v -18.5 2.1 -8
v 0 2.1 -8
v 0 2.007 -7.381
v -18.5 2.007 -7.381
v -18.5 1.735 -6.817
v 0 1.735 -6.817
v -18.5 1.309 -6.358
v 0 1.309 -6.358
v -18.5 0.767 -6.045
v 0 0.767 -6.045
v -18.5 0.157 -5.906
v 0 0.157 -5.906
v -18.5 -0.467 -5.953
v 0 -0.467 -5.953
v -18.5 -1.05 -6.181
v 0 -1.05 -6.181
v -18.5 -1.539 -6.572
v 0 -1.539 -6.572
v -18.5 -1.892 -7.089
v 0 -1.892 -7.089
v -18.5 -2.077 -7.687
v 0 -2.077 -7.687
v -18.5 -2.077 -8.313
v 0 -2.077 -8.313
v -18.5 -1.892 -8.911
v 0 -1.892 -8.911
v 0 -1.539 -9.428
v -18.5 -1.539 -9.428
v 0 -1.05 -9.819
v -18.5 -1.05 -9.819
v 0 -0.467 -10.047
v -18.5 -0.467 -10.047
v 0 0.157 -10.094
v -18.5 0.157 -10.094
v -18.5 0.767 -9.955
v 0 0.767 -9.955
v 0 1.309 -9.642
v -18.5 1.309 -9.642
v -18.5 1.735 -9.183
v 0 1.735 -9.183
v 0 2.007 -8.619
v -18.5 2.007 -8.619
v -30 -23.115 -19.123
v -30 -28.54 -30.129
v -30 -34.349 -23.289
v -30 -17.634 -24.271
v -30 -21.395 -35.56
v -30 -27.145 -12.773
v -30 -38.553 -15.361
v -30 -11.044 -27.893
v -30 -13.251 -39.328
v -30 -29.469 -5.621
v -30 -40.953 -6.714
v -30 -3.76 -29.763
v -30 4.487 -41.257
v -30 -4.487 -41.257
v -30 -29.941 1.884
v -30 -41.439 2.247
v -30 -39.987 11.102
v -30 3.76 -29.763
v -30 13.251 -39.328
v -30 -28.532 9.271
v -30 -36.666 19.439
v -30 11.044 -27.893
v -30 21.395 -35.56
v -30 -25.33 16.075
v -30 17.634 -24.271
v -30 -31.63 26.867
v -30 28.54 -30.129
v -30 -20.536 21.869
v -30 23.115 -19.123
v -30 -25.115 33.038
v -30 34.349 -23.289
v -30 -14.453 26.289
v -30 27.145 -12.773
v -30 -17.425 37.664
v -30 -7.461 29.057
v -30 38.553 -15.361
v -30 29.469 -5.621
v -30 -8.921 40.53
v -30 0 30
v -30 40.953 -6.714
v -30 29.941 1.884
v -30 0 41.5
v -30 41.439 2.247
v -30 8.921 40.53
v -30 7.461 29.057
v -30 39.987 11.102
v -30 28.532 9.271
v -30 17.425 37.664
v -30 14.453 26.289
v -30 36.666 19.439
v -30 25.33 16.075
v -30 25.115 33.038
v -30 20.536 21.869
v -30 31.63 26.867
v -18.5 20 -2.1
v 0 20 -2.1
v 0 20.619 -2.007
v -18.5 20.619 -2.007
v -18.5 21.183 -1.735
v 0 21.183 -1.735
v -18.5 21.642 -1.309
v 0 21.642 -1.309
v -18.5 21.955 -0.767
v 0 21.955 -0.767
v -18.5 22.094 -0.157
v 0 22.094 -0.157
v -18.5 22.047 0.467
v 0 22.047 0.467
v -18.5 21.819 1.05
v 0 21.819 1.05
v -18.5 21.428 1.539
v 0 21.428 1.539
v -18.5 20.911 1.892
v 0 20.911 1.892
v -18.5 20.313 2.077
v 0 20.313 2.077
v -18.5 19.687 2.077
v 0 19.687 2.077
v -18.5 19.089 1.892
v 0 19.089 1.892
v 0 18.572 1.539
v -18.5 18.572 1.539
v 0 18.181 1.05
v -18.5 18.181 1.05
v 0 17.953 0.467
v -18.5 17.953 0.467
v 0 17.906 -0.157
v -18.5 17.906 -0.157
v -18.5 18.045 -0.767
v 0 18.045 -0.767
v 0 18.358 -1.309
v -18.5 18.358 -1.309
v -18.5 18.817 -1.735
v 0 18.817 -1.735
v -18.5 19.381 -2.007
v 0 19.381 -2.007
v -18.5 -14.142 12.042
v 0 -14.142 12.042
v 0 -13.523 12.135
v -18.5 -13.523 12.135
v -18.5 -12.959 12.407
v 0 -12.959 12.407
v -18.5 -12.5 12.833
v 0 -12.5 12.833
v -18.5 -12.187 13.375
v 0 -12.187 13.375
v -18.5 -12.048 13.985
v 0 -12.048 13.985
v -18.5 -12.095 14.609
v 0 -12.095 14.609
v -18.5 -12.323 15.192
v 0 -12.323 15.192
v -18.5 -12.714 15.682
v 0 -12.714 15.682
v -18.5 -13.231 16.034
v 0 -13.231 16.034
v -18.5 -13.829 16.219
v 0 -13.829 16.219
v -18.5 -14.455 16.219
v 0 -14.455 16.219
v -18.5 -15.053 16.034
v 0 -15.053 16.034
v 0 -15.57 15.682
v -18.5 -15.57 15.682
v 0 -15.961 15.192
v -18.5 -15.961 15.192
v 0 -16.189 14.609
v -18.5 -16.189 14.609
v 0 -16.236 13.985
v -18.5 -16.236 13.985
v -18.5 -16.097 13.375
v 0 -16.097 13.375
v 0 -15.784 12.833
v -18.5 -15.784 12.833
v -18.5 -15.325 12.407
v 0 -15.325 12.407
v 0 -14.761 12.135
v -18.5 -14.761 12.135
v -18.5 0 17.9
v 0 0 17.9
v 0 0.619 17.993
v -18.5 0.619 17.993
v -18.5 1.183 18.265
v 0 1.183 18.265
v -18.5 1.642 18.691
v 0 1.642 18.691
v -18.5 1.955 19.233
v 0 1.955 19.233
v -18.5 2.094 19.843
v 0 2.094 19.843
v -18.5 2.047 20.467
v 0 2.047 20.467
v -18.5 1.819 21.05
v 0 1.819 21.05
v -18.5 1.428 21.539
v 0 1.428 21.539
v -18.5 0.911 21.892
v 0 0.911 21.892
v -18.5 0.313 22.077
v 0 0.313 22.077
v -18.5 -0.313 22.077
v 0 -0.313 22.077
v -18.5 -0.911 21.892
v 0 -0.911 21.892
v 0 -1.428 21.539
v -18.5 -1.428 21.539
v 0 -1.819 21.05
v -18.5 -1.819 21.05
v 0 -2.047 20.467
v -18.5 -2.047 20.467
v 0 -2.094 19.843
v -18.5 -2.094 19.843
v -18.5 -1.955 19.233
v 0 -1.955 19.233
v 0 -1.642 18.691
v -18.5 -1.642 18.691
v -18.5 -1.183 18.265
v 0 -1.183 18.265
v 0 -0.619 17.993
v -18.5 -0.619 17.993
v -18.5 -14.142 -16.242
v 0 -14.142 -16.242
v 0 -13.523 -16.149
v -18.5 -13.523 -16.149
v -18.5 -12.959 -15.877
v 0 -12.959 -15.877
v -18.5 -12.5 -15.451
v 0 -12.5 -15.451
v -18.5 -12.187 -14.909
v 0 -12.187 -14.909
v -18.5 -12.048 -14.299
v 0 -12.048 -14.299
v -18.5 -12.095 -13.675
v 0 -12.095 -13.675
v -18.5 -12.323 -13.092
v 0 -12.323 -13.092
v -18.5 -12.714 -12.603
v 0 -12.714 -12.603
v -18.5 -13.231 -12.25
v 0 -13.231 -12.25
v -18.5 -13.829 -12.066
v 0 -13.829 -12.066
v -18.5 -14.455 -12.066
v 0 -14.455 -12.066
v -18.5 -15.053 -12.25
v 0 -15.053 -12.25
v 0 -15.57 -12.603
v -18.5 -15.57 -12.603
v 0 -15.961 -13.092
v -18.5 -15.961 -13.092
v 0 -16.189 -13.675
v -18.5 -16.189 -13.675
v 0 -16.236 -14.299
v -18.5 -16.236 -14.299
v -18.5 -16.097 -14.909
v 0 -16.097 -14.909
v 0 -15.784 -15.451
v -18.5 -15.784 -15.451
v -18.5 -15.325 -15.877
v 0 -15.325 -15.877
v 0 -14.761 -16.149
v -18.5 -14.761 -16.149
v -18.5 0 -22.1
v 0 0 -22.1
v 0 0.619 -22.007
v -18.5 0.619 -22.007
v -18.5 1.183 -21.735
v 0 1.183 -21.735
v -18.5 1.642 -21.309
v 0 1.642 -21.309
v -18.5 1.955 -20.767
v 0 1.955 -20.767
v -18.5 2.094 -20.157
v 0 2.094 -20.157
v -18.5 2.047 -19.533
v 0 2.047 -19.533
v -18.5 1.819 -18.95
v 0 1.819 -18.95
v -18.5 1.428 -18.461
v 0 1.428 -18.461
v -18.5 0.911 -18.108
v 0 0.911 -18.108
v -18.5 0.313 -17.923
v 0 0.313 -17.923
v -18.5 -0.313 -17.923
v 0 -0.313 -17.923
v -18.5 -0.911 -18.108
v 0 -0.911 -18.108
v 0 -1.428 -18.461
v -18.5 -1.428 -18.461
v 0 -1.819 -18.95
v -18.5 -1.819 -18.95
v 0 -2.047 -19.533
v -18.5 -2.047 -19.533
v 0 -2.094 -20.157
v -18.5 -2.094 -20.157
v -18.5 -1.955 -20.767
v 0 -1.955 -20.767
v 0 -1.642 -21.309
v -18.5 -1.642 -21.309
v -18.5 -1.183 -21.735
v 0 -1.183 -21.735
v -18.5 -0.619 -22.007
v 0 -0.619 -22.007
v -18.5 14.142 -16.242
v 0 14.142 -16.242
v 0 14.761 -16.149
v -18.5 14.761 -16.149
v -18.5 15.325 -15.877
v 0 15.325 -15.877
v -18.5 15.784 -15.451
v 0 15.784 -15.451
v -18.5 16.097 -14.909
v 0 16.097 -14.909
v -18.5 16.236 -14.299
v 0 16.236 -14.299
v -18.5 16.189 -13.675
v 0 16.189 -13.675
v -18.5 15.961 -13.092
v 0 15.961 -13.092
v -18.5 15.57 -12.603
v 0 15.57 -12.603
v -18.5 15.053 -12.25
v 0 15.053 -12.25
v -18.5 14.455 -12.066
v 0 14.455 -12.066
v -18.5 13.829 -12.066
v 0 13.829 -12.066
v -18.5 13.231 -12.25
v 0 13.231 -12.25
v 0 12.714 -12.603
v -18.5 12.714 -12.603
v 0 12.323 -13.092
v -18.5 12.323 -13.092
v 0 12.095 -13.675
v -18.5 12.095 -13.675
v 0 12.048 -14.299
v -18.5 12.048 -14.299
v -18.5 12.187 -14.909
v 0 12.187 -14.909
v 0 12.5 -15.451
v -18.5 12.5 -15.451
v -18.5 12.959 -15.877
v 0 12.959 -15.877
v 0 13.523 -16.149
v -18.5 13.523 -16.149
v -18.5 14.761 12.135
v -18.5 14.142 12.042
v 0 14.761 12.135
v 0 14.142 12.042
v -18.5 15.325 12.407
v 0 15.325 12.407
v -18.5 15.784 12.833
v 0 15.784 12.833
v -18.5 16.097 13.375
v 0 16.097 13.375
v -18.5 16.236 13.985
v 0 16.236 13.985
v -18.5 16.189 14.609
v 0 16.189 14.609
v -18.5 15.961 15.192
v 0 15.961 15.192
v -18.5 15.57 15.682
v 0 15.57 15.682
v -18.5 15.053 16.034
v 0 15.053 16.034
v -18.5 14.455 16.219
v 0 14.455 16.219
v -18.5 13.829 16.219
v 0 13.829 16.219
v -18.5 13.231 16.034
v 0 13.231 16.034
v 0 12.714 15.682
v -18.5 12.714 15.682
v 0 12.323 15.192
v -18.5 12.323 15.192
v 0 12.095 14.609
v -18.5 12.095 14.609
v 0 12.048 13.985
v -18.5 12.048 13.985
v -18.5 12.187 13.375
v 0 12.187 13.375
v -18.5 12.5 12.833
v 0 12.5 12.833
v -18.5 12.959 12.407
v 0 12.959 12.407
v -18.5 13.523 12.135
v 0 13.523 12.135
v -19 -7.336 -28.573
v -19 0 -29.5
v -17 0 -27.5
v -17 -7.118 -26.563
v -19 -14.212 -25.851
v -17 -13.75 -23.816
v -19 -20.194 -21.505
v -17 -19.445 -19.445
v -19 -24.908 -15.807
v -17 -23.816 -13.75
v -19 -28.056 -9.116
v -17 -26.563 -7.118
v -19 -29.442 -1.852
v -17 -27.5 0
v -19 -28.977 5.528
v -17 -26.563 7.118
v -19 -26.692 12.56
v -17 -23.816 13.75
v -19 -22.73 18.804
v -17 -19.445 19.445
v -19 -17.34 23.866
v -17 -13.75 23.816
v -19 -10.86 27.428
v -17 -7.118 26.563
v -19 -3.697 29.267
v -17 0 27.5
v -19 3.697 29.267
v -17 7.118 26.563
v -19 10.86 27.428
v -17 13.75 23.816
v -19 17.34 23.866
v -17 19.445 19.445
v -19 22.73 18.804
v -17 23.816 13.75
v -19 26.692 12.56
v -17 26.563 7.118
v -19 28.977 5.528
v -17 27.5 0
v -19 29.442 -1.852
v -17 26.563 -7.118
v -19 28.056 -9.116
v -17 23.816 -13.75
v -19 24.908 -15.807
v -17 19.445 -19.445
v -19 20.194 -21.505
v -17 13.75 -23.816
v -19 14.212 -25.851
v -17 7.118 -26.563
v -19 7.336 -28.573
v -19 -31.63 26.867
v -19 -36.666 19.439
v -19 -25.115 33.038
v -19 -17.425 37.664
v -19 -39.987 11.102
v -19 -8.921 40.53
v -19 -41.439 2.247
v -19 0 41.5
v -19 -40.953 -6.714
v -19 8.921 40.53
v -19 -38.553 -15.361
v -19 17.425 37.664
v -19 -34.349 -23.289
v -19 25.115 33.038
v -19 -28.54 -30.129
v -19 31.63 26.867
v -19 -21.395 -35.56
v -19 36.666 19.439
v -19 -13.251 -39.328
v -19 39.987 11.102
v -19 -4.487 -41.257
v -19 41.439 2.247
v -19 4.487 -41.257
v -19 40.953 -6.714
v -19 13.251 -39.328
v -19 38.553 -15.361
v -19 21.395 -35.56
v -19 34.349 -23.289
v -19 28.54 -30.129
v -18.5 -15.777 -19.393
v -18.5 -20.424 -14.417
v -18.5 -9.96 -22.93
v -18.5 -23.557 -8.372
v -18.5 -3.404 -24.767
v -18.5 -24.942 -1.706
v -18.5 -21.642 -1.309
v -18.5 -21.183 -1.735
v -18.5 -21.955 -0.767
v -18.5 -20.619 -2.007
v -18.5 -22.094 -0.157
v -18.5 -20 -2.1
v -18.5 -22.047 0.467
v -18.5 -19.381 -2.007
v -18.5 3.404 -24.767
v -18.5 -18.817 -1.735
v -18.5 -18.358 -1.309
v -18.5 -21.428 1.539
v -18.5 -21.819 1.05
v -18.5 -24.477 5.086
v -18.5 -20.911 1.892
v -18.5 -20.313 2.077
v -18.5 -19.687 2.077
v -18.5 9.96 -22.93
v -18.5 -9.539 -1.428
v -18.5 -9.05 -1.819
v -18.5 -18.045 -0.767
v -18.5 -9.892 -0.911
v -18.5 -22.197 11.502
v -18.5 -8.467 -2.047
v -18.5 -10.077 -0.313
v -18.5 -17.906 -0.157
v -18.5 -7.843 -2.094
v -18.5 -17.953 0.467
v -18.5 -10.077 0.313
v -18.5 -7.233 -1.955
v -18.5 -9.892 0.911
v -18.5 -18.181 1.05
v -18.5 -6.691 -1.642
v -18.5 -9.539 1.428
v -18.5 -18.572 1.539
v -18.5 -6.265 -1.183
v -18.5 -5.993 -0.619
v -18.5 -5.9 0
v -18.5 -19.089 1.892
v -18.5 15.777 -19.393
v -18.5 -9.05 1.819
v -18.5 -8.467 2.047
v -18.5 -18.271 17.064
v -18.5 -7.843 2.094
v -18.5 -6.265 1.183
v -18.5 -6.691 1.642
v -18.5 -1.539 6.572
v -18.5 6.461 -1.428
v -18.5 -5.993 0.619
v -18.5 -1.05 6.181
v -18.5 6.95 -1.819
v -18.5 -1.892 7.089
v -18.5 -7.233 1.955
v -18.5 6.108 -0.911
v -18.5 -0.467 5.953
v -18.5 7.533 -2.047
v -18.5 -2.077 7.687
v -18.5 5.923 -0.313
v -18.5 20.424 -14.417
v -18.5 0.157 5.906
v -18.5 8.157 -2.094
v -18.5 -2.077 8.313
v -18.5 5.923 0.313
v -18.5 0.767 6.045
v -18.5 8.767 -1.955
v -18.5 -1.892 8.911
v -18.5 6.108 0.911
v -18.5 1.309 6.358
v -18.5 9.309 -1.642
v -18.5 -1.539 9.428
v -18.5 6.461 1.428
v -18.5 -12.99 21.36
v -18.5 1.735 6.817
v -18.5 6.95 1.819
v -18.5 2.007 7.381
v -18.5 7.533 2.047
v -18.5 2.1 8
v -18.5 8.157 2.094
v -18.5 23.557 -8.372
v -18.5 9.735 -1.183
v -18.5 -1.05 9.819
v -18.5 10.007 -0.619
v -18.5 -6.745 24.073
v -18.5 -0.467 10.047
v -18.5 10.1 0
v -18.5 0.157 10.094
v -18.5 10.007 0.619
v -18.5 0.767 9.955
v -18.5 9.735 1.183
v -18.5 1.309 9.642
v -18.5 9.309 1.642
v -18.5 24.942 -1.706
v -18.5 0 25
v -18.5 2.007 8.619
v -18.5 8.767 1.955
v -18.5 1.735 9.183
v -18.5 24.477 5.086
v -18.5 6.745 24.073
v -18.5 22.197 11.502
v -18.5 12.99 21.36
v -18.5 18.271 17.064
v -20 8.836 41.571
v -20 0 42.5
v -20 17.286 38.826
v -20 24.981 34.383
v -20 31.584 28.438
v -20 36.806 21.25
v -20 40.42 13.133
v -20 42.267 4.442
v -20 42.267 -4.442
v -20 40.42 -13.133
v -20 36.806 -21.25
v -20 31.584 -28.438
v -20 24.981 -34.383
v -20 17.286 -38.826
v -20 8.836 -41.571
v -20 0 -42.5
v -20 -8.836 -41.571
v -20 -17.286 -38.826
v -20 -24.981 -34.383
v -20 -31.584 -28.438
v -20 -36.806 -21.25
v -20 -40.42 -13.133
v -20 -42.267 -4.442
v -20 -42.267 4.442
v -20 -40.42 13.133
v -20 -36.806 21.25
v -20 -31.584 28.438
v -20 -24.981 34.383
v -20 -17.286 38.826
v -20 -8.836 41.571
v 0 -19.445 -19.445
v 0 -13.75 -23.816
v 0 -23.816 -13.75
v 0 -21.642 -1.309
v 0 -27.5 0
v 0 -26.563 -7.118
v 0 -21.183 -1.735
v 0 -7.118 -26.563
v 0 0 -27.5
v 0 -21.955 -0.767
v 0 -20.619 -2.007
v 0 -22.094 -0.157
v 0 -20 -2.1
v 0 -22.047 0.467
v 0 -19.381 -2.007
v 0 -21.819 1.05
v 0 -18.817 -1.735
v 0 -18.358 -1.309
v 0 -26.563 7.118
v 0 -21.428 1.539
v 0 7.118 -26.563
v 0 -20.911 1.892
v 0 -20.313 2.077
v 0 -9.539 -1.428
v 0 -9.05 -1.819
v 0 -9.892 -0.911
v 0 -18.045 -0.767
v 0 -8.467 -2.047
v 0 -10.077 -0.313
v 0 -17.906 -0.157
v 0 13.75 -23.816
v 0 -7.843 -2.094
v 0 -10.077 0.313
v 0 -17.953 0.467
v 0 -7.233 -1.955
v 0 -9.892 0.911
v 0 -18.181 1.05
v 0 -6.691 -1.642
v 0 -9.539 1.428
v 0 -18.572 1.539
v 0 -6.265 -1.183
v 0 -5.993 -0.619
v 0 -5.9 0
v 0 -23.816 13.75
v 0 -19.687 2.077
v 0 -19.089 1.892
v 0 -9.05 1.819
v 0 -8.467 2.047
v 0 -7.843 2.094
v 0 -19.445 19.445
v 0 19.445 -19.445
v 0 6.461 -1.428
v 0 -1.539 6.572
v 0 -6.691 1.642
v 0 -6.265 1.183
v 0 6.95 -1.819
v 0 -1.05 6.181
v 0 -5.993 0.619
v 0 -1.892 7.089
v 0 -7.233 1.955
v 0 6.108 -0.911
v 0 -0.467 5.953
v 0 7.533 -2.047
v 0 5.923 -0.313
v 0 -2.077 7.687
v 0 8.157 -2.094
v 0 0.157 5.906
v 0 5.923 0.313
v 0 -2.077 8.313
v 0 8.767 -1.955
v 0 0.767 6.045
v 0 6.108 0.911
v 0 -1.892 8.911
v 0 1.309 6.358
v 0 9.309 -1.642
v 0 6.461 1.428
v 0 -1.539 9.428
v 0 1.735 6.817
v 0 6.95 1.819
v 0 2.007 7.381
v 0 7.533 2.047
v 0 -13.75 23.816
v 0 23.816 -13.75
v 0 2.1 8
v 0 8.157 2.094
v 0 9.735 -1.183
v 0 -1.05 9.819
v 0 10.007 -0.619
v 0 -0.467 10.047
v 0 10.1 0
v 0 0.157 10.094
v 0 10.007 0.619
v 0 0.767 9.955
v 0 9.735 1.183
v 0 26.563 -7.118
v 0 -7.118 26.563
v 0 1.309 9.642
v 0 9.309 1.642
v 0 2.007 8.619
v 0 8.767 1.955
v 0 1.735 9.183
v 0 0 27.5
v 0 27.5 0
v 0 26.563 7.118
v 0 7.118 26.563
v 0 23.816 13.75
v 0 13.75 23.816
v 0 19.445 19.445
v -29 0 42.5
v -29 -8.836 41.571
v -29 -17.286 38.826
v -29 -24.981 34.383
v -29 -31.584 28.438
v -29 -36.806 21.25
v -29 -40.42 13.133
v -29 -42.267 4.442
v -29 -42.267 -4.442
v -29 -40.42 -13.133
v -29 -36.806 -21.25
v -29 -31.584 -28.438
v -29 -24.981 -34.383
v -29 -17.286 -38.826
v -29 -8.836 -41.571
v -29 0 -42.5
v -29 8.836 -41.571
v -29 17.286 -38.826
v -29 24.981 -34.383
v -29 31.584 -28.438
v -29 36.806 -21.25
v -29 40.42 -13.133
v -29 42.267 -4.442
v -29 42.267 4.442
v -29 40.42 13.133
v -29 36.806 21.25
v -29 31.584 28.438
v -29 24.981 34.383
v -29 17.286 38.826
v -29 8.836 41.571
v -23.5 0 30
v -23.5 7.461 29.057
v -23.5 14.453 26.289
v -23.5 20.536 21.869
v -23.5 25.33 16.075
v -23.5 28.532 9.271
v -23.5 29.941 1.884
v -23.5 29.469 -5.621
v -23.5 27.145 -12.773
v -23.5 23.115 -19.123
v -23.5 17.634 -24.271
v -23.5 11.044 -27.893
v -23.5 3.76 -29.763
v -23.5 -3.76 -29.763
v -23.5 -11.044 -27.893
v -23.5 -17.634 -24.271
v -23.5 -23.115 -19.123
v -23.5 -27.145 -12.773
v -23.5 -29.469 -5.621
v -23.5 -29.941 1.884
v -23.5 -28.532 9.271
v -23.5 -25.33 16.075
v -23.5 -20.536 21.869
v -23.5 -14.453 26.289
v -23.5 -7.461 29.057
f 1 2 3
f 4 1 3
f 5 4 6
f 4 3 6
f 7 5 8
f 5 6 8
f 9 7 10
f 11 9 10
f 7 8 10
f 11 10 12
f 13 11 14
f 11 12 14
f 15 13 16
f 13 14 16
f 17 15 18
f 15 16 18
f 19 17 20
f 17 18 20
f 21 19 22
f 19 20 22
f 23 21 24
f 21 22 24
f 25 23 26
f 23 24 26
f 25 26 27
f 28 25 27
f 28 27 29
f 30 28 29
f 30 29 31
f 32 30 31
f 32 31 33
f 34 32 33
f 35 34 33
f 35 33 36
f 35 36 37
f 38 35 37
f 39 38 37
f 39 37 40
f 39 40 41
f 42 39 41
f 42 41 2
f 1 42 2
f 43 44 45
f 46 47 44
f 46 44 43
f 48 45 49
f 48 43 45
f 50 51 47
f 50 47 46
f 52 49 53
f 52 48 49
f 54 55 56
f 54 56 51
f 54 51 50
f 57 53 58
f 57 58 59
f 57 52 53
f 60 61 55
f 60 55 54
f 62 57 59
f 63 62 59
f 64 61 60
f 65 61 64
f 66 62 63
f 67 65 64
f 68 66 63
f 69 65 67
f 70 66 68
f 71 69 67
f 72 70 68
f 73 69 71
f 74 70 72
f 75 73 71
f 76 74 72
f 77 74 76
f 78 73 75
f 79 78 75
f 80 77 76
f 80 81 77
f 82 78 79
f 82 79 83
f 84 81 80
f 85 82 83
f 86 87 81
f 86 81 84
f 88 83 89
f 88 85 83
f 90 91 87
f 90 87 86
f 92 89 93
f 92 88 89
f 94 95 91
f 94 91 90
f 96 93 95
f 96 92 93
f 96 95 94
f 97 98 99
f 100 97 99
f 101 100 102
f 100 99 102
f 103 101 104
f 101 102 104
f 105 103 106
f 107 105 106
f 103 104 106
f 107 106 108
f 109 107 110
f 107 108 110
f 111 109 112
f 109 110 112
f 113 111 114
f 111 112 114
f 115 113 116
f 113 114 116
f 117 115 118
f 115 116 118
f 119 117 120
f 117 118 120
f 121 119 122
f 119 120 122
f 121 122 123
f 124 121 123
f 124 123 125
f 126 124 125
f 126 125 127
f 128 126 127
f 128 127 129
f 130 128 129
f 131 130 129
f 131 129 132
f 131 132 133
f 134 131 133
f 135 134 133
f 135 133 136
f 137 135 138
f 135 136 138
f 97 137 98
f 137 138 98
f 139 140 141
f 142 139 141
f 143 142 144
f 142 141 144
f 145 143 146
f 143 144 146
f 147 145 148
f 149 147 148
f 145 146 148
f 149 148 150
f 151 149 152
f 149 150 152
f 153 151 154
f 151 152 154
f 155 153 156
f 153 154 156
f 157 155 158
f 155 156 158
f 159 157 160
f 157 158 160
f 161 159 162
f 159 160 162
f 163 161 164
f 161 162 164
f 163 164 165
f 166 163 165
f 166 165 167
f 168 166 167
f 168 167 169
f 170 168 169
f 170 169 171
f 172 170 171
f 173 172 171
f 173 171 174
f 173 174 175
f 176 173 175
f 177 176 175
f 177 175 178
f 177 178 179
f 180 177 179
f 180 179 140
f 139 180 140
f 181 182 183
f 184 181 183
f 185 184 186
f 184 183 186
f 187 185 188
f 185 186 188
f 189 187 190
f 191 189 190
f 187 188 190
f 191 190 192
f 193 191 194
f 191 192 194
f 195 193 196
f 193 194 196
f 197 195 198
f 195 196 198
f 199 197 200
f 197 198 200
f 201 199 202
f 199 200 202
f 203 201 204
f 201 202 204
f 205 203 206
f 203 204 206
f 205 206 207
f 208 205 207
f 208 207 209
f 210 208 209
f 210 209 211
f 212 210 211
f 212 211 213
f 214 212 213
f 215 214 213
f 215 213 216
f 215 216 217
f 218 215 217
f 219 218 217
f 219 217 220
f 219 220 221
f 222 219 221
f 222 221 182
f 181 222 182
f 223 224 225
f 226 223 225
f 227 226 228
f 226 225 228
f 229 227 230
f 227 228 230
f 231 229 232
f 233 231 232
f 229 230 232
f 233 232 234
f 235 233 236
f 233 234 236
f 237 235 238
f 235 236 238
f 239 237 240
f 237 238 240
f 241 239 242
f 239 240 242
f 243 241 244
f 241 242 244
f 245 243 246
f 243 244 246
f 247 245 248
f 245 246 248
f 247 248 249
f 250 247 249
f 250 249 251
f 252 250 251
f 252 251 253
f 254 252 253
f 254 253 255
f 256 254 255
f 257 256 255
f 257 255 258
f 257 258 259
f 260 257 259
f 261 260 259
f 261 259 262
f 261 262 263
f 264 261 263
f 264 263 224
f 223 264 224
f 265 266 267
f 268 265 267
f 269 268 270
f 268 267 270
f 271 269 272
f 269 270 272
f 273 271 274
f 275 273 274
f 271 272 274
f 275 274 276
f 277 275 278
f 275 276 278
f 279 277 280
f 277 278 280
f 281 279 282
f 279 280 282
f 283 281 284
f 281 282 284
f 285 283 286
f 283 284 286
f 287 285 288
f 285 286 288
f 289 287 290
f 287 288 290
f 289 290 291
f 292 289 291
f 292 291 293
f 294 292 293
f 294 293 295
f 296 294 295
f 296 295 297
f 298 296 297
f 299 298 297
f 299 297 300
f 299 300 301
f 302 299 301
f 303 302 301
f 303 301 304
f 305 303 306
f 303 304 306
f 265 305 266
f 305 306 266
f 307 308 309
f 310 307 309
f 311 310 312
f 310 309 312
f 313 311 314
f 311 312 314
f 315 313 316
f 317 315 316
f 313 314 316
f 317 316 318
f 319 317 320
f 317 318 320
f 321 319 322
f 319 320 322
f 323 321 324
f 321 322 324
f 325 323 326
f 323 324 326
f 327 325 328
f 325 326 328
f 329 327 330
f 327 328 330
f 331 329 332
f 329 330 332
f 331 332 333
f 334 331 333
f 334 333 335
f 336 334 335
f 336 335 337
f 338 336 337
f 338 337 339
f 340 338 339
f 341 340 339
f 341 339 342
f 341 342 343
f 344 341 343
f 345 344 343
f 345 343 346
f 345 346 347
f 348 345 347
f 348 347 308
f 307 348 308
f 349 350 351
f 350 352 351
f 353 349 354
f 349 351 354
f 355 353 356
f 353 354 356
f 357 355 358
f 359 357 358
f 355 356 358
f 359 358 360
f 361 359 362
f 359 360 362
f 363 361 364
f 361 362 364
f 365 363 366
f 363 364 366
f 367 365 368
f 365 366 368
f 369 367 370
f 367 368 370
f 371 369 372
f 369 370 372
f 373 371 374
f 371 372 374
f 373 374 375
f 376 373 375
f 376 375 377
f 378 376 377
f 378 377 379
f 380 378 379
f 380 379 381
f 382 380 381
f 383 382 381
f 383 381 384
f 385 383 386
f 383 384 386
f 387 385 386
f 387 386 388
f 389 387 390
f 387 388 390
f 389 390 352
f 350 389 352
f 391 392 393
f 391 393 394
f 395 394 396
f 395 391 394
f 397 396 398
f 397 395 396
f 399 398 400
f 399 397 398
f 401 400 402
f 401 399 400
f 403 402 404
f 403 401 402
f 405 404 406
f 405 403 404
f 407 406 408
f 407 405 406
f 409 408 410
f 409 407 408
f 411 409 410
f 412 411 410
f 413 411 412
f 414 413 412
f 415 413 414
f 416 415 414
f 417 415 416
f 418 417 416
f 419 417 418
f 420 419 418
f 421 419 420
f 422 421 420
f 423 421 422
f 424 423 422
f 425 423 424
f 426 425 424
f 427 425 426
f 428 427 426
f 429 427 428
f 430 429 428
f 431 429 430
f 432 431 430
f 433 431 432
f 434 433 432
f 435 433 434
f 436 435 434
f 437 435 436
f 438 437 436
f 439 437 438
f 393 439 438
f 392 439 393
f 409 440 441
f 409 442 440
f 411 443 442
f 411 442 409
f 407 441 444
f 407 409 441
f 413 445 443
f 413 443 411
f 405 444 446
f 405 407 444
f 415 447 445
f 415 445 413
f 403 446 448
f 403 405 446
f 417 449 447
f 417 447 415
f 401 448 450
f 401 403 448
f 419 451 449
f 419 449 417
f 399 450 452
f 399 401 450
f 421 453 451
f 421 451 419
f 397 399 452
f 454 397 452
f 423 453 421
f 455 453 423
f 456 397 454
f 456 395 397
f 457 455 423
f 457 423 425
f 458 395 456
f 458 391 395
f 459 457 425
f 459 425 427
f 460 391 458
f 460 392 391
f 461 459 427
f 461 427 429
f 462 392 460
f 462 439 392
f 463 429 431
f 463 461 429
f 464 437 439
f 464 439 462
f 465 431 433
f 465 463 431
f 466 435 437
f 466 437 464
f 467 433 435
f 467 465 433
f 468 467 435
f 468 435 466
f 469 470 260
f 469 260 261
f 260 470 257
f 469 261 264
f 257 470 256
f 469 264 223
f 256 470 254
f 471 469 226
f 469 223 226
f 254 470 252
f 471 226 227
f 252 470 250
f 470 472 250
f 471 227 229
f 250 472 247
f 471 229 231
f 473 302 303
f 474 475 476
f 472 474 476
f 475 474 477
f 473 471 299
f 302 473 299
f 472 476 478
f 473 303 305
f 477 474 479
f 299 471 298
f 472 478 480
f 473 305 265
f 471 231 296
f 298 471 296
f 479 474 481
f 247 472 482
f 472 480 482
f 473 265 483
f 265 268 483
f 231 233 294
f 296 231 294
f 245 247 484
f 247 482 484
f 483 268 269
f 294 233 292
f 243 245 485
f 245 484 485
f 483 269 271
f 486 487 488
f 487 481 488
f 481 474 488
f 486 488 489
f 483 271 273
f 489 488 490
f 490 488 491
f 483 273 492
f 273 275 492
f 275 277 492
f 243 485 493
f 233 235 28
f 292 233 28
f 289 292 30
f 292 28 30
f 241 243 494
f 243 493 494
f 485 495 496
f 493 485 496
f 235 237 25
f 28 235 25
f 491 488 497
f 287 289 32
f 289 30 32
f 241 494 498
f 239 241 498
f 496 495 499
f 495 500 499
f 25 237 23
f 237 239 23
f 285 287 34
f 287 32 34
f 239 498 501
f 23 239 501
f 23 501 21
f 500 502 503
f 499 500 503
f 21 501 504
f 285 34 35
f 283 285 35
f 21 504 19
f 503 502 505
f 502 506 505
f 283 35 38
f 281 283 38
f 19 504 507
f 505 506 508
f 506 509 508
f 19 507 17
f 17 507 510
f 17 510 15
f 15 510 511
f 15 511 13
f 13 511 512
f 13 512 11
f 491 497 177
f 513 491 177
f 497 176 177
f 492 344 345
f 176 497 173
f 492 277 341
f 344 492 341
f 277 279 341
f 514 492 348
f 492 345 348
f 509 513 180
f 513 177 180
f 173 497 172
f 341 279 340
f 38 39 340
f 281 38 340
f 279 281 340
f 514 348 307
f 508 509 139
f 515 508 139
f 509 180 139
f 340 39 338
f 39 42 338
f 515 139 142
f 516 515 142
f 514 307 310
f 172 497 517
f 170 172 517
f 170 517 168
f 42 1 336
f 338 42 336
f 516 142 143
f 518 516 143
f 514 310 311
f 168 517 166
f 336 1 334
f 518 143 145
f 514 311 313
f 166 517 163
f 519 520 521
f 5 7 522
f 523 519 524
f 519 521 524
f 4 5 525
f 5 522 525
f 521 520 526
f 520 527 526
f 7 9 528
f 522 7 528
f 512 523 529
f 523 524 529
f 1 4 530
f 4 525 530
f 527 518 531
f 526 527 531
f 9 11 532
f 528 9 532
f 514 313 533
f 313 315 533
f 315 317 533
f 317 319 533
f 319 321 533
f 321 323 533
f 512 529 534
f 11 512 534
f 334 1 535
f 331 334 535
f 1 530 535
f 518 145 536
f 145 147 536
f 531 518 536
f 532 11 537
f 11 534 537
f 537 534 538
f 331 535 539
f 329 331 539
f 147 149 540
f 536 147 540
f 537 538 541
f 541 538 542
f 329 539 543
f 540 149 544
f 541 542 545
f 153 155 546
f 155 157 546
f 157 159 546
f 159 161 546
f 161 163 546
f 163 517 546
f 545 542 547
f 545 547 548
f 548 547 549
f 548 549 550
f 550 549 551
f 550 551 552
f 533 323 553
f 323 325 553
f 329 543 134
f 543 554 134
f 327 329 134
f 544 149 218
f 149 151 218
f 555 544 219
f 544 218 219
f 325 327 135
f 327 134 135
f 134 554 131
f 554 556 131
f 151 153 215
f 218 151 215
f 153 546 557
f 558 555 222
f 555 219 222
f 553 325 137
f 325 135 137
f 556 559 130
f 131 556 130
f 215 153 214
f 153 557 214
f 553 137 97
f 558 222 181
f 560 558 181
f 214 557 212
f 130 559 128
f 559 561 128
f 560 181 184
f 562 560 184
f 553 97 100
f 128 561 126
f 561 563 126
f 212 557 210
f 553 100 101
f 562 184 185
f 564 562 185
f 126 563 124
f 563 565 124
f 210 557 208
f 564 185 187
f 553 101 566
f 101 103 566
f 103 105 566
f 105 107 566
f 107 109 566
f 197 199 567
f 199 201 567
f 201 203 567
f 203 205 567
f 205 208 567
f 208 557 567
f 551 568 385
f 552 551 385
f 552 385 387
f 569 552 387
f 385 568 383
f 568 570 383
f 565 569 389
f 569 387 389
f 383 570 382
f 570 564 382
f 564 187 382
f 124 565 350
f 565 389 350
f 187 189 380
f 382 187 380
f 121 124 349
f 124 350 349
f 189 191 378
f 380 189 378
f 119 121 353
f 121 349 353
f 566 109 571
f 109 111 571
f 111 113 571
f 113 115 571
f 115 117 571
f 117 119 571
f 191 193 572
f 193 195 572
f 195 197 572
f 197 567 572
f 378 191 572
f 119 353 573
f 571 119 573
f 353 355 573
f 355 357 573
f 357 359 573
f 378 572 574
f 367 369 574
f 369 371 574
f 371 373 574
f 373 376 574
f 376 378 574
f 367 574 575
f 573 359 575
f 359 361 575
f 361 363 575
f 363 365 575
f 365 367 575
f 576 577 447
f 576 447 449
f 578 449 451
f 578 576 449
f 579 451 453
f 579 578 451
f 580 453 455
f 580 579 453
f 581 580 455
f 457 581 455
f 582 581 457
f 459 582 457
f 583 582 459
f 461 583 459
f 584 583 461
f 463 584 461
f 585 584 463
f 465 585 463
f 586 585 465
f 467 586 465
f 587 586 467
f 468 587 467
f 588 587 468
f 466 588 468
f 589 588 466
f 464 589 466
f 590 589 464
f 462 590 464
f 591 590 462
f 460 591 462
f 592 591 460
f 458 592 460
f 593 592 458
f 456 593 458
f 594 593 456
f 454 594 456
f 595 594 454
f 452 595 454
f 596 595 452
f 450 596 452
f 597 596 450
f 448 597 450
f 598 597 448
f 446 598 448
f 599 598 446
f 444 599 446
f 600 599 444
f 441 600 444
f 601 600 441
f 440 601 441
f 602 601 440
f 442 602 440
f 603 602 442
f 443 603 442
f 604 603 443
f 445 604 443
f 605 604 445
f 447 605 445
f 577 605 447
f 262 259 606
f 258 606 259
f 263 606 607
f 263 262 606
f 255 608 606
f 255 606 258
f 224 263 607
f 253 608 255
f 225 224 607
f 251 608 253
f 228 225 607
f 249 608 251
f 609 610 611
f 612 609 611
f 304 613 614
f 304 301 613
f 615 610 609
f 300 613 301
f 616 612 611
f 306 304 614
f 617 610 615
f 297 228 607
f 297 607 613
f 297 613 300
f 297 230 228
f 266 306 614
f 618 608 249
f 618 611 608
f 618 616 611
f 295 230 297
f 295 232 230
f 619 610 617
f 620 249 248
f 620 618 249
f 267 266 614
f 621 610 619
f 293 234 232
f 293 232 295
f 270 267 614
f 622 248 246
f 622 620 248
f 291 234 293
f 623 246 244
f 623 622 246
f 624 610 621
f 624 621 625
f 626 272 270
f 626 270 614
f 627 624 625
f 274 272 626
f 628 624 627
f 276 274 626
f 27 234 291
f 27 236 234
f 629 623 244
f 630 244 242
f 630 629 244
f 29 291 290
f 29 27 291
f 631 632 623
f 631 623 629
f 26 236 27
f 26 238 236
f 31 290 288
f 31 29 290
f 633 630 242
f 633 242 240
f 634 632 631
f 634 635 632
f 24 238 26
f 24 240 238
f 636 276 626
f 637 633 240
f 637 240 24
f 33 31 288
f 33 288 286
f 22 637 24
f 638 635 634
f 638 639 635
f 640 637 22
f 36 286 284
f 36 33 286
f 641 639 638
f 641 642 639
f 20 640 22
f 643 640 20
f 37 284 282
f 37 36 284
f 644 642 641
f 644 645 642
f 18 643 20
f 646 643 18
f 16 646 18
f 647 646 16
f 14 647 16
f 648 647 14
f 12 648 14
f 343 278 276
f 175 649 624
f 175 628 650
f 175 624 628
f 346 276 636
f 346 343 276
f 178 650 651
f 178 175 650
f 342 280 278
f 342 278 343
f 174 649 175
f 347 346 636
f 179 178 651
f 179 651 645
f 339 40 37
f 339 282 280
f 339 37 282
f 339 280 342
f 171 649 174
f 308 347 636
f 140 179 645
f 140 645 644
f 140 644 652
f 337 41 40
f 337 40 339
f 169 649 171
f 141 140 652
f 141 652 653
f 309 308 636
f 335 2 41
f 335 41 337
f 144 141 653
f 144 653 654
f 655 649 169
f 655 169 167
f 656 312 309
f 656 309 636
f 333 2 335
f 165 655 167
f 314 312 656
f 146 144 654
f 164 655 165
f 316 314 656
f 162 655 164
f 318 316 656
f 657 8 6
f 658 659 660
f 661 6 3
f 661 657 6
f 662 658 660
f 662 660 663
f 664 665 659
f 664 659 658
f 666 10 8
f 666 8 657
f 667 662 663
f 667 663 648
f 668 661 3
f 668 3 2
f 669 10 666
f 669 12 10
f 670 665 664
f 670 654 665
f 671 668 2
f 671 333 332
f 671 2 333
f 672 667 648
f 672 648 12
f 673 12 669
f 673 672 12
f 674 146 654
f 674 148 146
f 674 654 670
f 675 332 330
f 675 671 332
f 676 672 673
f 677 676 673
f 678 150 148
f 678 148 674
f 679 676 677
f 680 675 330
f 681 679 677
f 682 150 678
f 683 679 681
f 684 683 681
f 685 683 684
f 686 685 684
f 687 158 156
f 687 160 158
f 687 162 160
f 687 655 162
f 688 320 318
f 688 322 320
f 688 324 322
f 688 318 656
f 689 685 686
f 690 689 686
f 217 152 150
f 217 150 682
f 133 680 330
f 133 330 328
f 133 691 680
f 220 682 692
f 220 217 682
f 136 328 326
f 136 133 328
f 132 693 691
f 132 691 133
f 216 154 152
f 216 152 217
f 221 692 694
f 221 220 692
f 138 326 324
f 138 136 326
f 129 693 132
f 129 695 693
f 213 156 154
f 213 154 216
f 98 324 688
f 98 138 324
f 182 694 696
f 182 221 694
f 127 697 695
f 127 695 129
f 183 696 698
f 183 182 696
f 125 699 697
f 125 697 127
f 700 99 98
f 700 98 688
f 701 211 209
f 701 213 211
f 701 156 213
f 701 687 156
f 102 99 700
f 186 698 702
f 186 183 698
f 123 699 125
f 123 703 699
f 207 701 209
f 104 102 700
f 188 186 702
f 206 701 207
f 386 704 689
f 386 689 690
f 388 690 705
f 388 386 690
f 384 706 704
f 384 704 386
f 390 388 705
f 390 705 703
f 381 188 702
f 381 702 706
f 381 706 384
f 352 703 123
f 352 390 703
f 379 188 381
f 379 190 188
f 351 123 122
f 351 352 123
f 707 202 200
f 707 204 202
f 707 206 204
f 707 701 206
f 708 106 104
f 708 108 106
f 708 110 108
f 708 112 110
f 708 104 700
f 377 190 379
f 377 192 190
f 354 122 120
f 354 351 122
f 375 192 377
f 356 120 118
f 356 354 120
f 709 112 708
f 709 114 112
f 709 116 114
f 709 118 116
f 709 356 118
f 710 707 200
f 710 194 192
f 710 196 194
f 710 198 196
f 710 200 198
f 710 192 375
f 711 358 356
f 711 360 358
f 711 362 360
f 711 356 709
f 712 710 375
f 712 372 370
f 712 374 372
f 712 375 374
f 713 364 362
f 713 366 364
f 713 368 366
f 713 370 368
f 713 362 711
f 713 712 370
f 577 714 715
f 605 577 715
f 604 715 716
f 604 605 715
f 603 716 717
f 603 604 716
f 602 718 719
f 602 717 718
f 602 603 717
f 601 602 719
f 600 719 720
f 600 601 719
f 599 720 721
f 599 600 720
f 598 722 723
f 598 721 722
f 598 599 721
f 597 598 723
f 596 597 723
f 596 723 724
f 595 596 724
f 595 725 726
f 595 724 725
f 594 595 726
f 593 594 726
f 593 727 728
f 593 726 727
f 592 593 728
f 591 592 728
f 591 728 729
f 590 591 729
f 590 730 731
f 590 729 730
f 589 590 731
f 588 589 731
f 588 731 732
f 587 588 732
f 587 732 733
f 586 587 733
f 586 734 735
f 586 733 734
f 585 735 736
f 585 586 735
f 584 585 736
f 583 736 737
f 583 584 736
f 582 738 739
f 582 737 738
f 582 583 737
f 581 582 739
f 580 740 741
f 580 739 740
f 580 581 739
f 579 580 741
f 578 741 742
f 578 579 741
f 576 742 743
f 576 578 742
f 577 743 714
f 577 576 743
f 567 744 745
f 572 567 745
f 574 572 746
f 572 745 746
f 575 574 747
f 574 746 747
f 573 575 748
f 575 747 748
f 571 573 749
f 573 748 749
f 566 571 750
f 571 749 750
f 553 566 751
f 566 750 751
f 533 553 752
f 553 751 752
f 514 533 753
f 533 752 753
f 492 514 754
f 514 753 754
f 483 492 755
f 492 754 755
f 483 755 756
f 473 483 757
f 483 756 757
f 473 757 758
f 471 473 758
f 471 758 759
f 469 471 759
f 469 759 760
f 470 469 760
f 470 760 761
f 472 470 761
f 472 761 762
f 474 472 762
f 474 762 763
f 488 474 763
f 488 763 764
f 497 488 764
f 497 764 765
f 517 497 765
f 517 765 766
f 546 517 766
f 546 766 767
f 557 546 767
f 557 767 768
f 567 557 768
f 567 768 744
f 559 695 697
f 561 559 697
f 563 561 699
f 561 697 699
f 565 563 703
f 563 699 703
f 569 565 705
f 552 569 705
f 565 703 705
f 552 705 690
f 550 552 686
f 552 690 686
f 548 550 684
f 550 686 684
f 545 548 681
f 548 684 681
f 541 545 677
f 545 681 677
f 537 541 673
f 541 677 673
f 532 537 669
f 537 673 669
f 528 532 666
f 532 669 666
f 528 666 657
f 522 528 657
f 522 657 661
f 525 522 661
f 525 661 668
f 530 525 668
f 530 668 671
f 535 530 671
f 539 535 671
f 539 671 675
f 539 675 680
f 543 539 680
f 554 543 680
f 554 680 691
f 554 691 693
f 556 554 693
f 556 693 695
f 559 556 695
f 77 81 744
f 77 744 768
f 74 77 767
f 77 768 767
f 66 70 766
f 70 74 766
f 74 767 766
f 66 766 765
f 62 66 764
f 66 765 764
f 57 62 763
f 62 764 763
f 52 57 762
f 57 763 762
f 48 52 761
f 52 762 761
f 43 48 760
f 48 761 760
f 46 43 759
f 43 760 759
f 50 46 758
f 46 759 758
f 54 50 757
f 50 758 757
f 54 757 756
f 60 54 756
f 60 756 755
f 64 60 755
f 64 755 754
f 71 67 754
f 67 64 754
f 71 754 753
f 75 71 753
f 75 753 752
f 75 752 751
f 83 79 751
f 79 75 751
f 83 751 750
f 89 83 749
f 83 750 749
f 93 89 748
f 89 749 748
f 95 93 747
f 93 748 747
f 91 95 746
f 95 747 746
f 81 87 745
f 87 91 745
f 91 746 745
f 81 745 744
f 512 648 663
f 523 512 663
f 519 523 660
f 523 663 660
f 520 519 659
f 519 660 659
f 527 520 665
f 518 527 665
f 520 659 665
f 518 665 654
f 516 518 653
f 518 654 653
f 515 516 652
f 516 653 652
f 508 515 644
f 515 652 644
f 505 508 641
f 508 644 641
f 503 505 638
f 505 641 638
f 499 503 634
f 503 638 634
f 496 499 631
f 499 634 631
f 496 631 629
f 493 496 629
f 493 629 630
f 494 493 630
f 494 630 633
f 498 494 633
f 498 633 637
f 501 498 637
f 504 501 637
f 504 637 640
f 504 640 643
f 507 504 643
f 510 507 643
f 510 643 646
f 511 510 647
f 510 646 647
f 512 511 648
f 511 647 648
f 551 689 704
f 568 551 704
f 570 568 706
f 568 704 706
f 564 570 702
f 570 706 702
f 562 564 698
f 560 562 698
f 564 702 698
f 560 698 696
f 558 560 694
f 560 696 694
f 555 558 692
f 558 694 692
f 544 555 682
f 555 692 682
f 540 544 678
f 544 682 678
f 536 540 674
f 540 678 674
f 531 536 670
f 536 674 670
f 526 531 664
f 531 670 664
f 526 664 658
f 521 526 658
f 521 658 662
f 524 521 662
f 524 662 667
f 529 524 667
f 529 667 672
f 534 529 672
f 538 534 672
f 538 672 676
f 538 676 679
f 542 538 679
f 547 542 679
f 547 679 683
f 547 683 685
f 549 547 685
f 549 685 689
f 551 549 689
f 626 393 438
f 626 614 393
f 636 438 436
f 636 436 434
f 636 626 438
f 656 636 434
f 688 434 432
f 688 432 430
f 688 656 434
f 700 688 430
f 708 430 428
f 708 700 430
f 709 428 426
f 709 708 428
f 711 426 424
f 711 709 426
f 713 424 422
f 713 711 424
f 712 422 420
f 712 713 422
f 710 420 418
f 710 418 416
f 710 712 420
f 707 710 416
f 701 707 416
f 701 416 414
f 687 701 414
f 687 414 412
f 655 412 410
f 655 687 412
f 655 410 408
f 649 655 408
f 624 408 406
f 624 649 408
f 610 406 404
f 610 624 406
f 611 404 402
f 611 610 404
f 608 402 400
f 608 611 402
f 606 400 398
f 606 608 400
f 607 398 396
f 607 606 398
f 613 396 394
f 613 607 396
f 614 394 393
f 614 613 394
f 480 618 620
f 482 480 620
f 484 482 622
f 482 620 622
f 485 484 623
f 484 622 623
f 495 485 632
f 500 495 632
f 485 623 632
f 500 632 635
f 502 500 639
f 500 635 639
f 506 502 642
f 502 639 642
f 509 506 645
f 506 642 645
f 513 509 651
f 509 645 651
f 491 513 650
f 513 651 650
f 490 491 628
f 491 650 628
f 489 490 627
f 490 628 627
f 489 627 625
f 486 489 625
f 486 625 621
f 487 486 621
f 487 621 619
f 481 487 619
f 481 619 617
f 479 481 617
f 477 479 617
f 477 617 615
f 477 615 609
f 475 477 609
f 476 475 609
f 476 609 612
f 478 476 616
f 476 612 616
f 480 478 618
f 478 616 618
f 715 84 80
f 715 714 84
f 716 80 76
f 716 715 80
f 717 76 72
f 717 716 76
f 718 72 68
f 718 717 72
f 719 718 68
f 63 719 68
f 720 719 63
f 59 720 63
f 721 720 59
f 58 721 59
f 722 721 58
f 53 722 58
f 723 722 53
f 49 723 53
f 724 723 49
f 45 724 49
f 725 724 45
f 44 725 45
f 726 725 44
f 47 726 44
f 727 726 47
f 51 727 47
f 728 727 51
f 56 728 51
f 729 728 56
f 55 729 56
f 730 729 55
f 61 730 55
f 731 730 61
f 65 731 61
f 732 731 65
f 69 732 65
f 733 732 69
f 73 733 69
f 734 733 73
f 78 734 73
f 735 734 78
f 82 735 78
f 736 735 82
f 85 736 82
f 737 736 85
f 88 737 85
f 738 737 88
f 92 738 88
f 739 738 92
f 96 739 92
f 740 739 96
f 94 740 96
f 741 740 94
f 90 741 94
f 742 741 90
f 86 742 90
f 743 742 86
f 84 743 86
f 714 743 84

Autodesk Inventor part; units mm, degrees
ref_plane "YZ Plane" through (0, 0, 0) normal (1, 0, 0) x (0, 1, 0)
ref_plane "XZ Plane" through (0, 0, 0) normal (0, 1, 0) x (-1, 0, 0)
ref_plane "XY Plane" through (0, 0, 0) normal (0, 0, 1) x (1, 0, 0)
sketch "草图3" plane through (0, 0, 0) normal (1, 0, 0) x (0, 1, 0)
  circle A0 centre (0, 0) radius 8 construction
  circle A1 centre (0, -8) radius 2.1
  line L0 (0, 0) -> (0, -8) construction
  circle A2 centre (8, 0) radius 2.1
  circle A3 centre (0, 8) radius 2.1
  circle A4 centre (-8, 0) radius 2.1
  circle A5 centre (0, 0) radius 42.5
  dimension "d21" = 16
  dimension "d22" = 4.2
  dimension "d25" = 360
  dimension "d27" = 85
extrude "拉伸3" add sketch "草图3" against normal blind 18.5
sketch "草图6" plane through (-18.5, 0, 0) normal (-1, 0, 0) x (0, 0, 1)
  circle A0 centre (0, 0) radius 30
  circle A1 centre (0, 0) radius 42.5 projected
  dimension "d30" = 60
extrude "拉伸4" add sketch "草图6" along normal blind 11.5
chamfer "倒角1" distance 5 angle 45 1 edges at (-18.5, 0, -30)
sketch "草图7" plane through (0, 0, 0) normal (1, 0, 0) x (0, 0, -1)
  circle A0 centre (0, 0) radius 27.5
  circle A1 centre (0, 0) radius 42.5 projected
  dimension "d36" = 55
extrude "拉伸5" cut sketch "草图7" against normal blind 19
chamfer "倒角2" distance 2 angle 45 1 edges at (-19, 0, 27.5)
sketch "草图8" plane through (0, 0, 0) normal (1, 0, 0) x (0, 0, -1)
  circle A0 centre (0, 0) radius 20 construction
  circle A1 centre (20, 0) radius 2.1
  line L0 (20, 0) -> (0, 0) construction
  line L1 (14.1421, 14.1421) -> (0, 0) construction
  circle A2 centre (14.1421, 14.1421) radius 2.1
  line L2 (0, 20) -> (0, 0) construction
  circle A3 centre (0, 20) radius 2.1
  line L3 (-14.1421, 14.1421) -> (0, 0) construction
  circle A4 centre (-14.1421, 14.1421) radius 2.1
  line L4 (-20, 0) -> (0, 0) construction
  circle A5 centre (-20, 0) radius 2.1
  line L5 (-14.1421, -14.1421) -> (0, 0) construction
  circle A6 centre (-14.1421, -14.1421) radius 2.1
  line L6 (0, -20) -> (0, 0) construction
  circle A7 centre (0, -20) radius 2.1
  line L7 (14.1421, -14.1421) -> (0, 0) construction
  circle A8 centre (14.1421, -14.1421) radius 2.1
  dimension "d42" = 40
  dimension "d43" = 4.2
  dimension "d46" = 360
extrude "拉伸6" cut sketch "草图8" against normal through all
chamfer "倒角4" distance 1 angle 45 2 edges at (-19, 0, -42.5) (-30, 0, -42.5)
properties part number "主动轮"
